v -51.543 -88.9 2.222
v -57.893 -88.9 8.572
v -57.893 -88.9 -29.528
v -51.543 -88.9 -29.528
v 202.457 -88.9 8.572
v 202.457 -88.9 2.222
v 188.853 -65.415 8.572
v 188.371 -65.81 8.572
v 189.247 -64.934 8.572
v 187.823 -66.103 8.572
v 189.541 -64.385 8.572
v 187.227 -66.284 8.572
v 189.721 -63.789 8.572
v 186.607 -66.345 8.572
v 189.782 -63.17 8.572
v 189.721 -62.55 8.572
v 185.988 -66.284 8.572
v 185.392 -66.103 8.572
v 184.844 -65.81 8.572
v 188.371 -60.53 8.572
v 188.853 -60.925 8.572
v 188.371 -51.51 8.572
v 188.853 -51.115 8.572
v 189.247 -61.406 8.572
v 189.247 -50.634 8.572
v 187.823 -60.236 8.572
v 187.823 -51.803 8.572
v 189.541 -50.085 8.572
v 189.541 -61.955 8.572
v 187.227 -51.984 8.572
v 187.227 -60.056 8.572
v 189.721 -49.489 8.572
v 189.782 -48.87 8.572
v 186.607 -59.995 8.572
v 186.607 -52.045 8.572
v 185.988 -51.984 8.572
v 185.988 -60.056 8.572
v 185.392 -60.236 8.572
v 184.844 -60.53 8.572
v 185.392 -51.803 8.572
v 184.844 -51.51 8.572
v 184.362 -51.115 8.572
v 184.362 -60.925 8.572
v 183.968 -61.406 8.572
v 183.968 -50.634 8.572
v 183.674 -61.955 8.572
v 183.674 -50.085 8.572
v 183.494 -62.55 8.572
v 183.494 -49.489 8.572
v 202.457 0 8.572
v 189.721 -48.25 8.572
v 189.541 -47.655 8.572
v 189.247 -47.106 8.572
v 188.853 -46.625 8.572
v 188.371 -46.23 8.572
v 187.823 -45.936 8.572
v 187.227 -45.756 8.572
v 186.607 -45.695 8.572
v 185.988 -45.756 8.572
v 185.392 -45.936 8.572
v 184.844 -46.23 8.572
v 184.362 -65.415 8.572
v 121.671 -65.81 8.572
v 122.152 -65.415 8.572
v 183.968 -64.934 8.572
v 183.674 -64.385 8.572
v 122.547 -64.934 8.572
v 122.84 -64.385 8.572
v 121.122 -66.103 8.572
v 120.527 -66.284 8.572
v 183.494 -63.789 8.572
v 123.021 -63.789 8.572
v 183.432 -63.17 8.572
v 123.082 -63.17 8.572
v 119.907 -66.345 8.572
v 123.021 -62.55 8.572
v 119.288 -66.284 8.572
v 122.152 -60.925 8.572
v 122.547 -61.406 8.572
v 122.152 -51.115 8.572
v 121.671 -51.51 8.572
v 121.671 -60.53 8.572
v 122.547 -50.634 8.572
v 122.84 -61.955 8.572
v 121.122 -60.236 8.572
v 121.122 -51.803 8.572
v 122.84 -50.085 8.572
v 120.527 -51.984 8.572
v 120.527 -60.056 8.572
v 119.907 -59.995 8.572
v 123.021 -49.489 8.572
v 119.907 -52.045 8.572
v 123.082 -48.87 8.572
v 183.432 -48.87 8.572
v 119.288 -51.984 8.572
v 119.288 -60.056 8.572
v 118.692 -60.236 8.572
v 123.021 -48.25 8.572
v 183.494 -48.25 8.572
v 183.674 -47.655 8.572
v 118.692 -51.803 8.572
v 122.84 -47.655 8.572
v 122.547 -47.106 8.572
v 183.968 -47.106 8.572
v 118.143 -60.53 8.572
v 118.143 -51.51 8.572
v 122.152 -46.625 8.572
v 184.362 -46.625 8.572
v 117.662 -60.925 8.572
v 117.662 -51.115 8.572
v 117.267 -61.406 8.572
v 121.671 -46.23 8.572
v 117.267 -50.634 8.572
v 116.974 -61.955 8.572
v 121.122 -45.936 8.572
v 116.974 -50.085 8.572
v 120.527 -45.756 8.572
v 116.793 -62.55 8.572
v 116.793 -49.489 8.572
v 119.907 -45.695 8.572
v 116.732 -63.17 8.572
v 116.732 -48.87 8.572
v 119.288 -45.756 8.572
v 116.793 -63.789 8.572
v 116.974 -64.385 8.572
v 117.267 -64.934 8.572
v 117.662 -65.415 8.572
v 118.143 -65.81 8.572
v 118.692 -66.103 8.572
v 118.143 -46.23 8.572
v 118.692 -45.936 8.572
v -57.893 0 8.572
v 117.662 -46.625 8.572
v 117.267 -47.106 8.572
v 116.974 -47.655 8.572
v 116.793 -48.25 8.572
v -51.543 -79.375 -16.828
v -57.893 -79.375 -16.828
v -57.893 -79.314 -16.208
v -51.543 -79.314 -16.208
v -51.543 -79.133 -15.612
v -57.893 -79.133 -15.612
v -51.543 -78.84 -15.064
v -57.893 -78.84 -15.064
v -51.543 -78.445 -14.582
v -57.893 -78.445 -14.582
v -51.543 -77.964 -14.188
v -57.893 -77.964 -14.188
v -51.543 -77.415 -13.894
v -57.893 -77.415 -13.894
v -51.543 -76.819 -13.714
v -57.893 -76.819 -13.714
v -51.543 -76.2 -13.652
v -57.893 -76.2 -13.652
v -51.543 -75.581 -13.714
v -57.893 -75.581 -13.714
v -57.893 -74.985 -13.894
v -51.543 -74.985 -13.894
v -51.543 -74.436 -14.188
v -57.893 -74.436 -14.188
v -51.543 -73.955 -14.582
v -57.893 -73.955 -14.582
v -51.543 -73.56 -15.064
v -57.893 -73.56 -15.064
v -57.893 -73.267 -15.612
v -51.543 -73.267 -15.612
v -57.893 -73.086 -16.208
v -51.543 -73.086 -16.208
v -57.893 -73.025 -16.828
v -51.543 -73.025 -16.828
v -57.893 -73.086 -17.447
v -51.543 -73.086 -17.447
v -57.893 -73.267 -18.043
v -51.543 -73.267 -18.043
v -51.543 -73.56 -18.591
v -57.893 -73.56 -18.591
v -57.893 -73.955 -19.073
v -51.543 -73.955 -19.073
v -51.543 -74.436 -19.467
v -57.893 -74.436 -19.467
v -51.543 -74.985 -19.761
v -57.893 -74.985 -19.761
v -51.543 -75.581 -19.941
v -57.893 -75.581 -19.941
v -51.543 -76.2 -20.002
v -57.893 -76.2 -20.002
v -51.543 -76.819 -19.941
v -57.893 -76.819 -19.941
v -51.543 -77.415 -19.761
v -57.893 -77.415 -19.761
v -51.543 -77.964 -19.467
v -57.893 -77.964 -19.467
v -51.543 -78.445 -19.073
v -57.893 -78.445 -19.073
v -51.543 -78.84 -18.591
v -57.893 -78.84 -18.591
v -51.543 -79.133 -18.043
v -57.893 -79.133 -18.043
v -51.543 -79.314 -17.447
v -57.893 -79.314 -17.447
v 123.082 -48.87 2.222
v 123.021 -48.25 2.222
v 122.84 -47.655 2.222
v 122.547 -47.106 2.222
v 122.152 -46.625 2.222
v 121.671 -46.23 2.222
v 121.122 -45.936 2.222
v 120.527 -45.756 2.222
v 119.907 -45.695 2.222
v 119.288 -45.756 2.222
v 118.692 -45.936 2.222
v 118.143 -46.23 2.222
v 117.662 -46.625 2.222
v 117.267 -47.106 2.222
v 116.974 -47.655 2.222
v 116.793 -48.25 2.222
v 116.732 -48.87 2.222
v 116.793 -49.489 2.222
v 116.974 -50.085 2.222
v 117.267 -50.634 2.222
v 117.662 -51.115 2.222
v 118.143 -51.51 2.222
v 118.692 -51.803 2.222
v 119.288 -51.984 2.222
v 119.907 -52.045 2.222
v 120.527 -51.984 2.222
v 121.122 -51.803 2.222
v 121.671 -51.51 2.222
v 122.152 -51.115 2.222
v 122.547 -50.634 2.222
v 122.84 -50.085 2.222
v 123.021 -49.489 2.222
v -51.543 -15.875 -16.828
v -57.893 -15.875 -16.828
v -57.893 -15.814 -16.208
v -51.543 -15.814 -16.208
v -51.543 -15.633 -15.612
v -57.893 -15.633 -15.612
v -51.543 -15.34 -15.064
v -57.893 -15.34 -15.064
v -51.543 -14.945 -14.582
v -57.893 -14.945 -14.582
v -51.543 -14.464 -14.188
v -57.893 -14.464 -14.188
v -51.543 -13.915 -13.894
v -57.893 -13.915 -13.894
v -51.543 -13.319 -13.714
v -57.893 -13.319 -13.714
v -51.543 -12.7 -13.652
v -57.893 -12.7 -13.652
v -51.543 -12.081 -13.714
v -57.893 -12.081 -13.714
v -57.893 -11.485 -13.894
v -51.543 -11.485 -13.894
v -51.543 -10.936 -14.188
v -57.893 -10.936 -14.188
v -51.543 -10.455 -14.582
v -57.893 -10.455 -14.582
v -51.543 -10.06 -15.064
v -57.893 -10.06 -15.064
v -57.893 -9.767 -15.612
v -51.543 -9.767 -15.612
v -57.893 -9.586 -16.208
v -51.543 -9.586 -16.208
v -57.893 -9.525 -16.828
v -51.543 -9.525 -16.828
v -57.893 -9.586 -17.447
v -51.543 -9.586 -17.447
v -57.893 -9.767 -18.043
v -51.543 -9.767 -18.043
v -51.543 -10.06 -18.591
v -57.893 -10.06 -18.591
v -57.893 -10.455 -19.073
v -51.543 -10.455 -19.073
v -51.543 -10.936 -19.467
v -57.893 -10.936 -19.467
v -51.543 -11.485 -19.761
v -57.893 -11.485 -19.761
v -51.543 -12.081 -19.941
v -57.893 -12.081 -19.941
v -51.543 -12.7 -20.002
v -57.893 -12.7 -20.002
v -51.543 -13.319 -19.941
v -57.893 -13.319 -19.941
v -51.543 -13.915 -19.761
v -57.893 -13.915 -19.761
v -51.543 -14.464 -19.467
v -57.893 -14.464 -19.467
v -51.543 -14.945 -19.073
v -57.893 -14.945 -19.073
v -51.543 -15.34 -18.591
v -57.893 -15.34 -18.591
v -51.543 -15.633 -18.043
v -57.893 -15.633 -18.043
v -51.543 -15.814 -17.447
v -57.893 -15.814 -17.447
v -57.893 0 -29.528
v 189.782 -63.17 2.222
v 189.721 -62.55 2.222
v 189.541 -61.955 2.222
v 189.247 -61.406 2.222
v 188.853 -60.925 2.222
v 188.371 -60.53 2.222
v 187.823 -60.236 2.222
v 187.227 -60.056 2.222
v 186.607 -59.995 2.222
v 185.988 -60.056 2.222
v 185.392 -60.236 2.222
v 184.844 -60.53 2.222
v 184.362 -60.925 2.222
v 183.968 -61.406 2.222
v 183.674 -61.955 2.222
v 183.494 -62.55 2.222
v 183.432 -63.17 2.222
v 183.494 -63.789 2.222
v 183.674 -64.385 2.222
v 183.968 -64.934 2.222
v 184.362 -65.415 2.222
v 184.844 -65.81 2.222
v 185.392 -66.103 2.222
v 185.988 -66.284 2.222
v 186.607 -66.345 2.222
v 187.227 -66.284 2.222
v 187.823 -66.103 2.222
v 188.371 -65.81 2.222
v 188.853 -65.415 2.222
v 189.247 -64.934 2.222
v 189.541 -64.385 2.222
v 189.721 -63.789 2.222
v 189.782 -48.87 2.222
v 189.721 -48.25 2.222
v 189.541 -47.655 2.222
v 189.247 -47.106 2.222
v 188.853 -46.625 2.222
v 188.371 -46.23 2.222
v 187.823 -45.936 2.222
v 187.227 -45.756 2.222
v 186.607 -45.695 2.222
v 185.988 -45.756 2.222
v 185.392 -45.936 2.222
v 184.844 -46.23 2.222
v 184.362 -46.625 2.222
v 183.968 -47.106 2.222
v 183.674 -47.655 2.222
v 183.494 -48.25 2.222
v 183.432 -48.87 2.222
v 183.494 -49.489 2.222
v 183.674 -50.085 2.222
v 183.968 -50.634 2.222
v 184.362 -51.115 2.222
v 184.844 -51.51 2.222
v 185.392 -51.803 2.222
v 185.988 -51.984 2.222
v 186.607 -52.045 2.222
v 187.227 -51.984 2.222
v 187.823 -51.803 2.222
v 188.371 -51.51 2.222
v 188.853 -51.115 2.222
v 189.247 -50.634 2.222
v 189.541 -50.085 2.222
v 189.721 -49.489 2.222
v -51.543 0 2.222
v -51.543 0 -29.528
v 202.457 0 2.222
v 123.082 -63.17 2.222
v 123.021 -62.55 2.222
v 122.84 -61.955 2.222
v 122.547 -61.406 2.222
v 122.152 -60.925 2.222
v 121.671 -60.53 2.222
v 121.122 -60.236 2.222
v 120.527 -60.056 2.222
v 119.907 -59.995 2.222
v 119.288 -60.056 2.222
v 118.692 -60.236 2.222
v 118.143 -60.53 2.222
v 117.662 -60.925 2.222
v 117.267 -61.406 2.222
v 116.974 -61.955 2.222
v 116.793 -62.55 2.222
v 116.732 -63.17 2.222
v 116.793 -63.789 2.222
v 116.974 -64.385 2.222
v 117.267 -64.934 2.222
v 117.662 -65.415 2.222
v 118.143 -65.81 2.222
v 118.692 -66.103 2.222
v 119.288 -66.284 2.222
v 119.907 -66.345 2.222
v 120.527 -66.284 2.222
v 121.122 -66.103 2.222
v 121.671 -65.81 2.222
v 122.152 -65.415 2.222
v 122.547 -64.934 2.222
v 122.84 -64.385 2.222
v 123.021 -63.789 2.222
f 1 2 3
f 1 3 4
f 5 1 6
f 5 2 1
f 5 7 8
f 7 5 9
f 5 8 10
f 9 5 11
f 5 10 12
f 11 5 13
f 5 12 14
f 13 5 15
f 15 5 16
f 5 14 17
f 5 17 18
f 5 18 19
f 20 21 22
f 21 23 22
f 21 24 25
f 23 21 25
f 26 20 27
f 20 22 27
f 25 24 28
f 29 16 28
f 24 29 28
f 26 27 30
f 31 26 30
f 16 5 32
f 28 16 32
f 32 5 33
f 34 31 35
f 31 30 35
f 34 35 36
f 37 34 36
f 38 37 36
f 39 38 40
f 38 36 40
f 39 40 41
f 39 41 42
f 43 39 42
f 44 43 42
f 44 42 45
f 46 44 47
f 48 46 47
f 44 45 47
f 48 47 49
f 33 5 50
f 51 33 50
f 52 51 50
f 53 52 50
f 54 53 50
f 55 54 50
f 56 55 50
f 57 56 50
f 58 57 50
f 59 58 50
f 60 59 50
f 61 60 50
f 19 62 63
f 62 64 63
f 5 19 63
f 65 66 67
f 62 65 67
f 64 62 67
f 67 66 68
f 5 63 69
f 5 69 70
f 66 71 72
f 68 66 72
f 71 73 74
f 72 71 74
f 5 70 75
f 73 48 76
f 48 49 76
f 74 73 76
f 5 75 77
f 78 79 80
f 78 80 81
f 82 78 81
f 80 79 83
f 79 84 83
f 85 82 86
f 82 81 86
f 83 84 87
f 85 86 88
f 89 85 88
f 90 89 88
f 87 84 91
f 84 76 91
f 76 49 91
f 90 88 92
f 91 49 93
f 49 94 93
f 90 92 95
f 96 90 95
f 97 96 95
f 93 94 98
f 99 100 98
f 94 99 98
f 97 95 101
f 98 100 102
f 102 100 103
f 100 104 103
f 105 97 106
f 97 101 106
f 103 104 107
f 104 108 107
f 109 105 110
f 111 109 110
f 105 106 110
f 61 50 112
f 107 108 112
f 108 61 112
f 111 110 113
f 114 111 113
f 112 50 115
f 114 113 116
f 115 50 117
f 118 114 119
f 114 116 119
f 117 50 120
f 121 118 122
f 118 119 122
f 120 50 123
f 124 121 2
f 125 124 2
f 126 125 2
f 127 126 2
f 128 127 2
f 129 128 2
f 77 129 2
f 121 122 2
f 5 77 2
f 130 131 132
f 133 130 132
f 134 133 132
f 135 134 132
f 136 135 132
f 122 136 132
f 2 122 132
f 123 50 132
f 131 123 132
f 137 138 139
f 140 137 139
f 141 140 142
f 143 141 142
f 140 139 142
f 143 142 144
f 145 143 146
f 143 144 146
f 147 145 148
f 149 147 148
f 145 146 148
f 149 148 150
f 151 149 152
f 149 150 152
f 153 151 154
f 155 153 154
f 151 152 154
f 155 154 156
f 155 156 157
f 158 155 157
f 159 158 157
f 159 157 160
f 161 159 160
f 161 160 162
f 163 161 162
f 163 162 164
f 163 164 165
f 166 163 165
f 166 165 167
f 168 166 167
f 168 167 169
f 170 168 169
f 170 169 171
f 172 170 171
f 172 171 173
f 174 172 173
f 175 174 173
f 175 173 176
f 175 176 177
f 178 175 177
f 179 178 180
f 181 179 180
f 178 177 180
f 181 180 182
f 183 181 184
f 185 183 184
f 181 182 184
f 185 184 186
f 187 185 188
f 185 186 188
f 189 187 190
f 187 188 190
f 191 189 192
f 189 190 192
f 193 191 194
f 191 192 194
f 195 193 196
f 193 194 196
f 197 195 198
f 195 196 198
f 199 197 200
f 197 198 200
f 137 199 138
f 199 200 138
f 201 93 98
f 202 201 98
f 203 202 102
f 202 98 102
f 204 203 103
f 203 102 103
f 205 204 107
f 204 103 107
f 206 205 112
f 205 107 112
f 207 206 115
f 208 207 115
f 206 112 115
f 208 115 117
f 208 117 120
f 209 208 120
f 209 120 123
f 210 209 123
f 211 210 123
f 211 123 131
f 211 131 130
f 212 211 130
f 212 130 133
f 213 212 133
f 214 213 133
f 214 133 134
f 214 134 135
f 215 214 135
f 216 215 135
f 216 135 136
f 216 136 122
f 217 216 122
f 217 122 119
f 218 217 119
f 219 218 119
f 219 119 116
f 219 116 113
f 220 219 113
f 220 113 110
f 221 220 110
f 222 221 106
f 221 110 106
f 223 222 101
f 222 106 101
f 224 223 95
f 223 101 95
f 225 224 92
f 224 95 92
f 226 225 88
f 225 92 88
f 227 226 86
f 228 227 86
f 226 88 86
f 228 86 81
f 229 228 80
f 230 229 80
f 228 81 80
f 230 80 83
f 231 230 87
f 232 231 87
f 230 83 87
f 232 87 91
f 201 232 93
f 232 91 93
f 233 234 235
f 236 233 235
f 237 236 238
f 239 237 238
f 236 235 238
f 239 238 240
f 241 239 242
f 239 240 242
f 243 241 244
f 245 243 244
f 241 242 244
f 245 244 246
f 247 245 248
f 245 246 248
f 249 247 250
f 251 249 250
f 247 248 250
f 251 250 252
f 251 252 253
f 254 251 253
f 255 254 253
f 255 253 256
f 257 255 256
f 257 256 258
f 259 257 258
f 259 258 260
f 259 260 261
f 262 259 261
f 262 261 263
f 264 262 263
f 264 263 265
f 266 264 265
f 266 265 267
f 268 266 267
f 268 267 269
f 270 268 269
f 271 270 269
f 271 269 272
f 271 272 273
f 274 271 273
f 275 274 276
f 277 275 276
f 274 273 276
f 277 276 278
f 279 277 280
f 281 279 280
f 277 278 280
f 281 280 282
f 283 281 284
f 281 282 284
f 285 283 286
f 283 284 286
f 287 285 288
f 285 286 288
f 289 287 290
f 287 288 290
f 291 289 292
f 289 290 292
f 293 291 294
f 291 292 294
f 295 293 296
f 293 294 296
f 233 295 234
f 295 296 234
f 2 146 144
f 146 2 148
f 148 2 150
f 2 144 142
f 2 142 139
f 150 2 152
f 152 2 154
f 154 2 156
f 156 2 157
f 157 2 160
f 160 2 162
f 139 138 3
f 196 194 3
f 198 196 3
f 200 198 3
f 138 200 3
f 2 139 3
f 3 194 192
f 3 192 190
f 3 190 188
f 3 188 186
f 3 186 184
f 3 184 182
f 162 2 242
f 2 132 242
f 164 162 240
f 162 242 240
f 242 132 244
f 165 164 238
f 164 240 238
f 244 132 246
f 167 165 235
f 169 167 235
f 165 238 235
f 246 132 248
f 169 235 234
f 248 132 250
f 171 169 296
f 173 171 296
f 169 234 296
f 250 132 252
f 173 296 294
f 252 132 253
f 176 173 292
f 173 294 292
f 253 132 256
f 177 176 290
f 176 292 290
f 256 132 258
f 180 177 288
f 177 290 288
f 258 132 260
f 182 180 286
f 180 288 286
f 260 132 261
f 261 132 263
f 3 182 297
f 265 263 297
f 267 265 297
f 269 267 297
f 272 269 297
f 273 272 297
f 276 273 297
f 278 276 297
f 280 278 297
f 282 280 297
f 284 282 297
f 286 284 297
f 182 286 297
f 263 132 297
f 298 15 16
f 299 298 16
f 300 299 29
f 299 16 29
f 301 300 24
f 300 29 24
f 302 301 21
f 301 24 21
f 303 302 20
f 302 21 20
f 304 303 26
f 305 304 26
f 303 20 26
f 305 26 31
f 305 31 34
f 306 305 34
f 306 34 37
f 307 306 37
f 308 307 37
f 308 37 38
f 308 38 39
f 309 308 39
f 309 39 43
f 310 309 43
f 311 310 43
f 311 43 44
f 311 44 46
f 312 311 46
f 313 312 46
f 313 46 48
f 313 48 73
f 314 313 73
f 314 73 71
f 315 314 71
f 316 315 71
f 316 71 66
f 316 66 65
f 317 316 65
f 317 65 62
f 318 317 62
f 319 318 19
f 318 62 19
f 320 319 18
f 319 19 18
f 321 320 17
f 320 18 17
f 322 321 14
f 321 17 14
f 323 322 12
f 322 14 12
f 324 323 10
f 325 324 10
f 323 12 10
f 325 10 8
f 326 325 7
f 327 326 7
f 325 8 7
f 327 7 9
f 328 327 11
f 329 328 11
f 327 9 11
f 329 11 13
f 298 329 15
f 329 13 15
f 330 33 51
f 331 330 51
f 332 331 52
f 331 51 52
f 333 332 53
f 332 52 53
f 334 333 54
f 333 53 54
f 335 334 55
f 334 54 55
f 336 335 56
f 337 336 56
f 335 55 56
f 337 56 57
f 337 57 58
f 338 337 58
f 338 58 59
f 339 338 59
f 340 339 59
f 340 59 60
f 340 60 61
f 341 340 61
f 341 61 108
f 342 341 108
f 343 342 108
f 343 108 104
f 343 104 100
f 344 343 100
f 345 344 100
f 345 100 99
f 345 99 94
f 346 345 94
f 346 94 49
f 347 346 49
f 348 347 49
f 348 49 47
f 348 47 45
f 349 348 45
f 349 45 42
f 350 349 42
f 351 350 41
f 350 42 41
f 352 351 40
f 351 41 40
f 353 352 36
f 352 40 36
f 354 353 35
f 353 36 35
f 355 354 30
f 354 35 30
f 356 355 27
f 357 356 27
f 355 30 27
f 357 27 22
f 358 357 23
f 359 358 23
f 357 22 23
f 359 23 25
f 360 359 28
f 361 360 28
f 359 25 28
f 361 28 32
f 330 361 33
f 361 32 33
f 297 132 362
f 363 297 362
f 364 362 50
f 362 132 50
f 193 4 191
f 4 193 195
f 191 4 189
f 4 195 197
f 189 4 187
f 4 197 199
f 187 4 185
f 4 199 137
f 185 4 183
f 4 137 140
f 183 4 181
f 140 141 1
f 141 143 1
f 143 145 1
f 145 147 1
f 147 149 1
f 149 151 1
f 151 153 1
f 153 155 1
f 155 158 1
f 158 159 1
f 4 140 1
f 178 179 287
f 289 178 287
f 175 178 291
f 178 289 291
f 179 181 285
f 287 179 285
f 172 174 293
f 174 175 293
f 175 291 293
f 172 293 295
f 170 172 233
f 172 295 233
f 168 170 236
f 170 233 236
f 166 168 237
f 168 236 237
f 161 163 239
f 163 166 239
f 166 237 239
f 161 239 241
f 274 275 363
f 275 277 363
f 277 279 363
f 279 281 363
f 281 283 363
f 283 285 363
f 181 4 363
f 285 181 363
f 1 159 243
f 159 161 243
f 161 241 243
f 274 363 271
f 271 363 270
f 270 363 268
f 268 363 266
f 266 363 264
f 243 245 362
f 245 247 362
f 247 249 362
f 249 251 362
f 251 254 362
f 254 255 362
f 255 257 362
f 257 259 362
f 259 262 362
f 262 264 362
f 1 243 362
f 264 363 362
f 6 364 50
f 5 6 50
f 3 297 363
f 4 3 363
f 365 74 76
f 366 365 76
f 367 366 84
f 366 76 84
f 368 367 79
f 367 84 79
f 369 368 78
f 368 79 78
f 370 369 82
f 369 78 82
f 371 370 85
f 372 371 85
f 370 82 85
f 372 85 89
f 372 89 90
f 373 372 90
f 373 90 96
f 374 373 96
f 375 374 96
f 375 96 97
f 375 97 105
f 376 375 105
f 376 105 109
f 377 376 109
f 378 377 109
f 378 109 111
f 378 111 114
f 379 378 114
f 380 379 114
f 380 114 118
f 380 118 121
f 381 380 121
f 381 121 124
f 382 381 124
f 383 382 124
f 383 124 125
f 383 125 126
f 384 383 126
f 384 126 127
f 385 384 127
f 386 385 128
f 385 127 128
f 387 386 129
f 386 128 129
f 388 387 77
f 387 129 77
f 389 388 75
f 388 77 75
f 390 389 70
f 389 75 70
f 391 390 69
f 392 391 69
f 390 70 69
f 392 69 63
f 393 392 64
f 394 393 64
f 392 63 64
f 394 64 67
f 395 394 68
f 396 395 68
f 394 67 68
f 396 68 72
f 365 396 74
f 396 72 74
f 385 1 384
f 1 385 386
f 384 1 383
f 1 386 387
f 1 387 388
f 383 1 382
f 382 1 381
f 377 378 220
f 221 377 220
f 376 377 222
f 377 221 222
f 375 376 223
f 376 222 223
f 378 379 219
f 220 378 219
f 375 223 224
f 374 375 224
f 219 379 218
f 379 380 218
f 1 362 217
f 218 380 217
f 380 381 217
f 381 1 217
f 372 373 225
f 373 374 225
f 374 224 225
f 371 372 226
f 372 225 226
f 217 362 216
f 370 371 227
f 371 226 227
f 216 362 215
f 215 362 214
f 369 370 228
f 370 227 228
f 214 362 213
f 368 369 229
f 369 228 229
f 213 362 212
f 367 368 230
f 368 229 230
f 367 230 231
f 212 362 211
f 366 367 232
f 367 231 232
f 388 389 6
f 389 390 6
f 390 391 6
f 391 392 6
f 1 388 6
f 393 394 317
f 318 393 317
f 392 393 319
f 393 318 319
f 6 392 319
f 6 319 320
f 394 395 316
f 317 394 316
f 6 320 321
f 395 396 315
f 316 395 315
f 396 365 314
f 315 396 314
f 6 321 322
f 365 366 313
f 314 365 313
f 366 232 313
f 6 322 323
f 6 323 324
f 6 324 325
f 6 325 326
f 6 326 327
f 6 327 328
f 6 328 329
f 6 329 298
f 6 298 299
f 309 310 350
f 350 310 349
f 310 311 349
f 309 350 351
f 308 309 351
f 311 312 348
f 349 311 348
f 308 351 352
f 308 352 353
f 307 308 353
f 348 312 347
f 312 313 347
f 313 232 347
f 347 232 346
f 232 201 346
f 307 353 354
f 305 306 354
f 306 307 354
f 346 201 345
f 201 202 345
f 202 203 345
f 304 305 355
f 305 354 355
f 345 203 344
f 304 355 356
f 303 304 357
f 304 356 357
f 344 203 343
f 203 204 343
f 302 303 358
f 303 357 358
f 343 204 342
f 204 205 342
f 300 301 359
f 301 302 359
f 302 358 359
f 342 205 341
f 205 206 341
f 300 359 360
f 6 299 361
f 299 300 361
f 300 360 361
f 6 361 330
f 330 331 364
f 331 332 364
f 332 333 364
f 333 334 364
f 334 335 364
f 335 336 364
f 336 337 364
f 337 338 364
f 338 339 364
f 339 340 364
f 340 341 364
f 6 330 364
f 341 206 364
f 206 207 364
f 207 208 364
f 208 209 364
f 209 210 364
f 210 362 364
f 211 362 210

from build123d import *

# Parameters (mm, degrees)
F1_DEPTH = 88.9
F2_R     = 3.175
F3_DEPTH = 25.4
F4_R     = 3.175
F5_DEPTH = 25.4


with BuildPart() as f1:
    # F0 (on Front) → F1 (new body)
    with BuildSketch(Plane.XZ):
        Polygon((-57.892904, 8.5725), (-57.892904, -29.5275), (-51.542904, -29.5275), (-51.542904, 2.2225), (202.457096, 2.2225), (202.457096, 8.5725), align=None)
    extrude(amount=F1_DEPTH)

    # F2 (on face) → F3 (cut)
    with BuildSketch(Plane.XY.offset(8.5725)):
        with Locations((119.907096, -63.1698)):
            Circle(F2_R)
        with Locations((119.907096, -48.8696)):
            Circle(F2_R)
        with Locations((186.607496, -63.1698)):
            Circle(F2_R)
        with Locations((186.607496, -48.8696)):
            Circle(F2_R)
    extrude(amount=-F3_DEPTH, mode=Mode.SUBTRACT)

    # F4 (on face) → F5 (cut)
    with BuildSketch(Plane(origin=(-57.892904, 0, 0), x_dir=(0, -1, 0), z_dir=(-1, 0, 0))):
        with Locations((12.7, -16.8275)):
            Circle(F4_R)
        with Locations((76.2, -16.8275)):
            Circle(F4_R)
    extrude(amount=-F5_DEPTH, mode=Mode.SUBTRACT)


solid = f1.part
